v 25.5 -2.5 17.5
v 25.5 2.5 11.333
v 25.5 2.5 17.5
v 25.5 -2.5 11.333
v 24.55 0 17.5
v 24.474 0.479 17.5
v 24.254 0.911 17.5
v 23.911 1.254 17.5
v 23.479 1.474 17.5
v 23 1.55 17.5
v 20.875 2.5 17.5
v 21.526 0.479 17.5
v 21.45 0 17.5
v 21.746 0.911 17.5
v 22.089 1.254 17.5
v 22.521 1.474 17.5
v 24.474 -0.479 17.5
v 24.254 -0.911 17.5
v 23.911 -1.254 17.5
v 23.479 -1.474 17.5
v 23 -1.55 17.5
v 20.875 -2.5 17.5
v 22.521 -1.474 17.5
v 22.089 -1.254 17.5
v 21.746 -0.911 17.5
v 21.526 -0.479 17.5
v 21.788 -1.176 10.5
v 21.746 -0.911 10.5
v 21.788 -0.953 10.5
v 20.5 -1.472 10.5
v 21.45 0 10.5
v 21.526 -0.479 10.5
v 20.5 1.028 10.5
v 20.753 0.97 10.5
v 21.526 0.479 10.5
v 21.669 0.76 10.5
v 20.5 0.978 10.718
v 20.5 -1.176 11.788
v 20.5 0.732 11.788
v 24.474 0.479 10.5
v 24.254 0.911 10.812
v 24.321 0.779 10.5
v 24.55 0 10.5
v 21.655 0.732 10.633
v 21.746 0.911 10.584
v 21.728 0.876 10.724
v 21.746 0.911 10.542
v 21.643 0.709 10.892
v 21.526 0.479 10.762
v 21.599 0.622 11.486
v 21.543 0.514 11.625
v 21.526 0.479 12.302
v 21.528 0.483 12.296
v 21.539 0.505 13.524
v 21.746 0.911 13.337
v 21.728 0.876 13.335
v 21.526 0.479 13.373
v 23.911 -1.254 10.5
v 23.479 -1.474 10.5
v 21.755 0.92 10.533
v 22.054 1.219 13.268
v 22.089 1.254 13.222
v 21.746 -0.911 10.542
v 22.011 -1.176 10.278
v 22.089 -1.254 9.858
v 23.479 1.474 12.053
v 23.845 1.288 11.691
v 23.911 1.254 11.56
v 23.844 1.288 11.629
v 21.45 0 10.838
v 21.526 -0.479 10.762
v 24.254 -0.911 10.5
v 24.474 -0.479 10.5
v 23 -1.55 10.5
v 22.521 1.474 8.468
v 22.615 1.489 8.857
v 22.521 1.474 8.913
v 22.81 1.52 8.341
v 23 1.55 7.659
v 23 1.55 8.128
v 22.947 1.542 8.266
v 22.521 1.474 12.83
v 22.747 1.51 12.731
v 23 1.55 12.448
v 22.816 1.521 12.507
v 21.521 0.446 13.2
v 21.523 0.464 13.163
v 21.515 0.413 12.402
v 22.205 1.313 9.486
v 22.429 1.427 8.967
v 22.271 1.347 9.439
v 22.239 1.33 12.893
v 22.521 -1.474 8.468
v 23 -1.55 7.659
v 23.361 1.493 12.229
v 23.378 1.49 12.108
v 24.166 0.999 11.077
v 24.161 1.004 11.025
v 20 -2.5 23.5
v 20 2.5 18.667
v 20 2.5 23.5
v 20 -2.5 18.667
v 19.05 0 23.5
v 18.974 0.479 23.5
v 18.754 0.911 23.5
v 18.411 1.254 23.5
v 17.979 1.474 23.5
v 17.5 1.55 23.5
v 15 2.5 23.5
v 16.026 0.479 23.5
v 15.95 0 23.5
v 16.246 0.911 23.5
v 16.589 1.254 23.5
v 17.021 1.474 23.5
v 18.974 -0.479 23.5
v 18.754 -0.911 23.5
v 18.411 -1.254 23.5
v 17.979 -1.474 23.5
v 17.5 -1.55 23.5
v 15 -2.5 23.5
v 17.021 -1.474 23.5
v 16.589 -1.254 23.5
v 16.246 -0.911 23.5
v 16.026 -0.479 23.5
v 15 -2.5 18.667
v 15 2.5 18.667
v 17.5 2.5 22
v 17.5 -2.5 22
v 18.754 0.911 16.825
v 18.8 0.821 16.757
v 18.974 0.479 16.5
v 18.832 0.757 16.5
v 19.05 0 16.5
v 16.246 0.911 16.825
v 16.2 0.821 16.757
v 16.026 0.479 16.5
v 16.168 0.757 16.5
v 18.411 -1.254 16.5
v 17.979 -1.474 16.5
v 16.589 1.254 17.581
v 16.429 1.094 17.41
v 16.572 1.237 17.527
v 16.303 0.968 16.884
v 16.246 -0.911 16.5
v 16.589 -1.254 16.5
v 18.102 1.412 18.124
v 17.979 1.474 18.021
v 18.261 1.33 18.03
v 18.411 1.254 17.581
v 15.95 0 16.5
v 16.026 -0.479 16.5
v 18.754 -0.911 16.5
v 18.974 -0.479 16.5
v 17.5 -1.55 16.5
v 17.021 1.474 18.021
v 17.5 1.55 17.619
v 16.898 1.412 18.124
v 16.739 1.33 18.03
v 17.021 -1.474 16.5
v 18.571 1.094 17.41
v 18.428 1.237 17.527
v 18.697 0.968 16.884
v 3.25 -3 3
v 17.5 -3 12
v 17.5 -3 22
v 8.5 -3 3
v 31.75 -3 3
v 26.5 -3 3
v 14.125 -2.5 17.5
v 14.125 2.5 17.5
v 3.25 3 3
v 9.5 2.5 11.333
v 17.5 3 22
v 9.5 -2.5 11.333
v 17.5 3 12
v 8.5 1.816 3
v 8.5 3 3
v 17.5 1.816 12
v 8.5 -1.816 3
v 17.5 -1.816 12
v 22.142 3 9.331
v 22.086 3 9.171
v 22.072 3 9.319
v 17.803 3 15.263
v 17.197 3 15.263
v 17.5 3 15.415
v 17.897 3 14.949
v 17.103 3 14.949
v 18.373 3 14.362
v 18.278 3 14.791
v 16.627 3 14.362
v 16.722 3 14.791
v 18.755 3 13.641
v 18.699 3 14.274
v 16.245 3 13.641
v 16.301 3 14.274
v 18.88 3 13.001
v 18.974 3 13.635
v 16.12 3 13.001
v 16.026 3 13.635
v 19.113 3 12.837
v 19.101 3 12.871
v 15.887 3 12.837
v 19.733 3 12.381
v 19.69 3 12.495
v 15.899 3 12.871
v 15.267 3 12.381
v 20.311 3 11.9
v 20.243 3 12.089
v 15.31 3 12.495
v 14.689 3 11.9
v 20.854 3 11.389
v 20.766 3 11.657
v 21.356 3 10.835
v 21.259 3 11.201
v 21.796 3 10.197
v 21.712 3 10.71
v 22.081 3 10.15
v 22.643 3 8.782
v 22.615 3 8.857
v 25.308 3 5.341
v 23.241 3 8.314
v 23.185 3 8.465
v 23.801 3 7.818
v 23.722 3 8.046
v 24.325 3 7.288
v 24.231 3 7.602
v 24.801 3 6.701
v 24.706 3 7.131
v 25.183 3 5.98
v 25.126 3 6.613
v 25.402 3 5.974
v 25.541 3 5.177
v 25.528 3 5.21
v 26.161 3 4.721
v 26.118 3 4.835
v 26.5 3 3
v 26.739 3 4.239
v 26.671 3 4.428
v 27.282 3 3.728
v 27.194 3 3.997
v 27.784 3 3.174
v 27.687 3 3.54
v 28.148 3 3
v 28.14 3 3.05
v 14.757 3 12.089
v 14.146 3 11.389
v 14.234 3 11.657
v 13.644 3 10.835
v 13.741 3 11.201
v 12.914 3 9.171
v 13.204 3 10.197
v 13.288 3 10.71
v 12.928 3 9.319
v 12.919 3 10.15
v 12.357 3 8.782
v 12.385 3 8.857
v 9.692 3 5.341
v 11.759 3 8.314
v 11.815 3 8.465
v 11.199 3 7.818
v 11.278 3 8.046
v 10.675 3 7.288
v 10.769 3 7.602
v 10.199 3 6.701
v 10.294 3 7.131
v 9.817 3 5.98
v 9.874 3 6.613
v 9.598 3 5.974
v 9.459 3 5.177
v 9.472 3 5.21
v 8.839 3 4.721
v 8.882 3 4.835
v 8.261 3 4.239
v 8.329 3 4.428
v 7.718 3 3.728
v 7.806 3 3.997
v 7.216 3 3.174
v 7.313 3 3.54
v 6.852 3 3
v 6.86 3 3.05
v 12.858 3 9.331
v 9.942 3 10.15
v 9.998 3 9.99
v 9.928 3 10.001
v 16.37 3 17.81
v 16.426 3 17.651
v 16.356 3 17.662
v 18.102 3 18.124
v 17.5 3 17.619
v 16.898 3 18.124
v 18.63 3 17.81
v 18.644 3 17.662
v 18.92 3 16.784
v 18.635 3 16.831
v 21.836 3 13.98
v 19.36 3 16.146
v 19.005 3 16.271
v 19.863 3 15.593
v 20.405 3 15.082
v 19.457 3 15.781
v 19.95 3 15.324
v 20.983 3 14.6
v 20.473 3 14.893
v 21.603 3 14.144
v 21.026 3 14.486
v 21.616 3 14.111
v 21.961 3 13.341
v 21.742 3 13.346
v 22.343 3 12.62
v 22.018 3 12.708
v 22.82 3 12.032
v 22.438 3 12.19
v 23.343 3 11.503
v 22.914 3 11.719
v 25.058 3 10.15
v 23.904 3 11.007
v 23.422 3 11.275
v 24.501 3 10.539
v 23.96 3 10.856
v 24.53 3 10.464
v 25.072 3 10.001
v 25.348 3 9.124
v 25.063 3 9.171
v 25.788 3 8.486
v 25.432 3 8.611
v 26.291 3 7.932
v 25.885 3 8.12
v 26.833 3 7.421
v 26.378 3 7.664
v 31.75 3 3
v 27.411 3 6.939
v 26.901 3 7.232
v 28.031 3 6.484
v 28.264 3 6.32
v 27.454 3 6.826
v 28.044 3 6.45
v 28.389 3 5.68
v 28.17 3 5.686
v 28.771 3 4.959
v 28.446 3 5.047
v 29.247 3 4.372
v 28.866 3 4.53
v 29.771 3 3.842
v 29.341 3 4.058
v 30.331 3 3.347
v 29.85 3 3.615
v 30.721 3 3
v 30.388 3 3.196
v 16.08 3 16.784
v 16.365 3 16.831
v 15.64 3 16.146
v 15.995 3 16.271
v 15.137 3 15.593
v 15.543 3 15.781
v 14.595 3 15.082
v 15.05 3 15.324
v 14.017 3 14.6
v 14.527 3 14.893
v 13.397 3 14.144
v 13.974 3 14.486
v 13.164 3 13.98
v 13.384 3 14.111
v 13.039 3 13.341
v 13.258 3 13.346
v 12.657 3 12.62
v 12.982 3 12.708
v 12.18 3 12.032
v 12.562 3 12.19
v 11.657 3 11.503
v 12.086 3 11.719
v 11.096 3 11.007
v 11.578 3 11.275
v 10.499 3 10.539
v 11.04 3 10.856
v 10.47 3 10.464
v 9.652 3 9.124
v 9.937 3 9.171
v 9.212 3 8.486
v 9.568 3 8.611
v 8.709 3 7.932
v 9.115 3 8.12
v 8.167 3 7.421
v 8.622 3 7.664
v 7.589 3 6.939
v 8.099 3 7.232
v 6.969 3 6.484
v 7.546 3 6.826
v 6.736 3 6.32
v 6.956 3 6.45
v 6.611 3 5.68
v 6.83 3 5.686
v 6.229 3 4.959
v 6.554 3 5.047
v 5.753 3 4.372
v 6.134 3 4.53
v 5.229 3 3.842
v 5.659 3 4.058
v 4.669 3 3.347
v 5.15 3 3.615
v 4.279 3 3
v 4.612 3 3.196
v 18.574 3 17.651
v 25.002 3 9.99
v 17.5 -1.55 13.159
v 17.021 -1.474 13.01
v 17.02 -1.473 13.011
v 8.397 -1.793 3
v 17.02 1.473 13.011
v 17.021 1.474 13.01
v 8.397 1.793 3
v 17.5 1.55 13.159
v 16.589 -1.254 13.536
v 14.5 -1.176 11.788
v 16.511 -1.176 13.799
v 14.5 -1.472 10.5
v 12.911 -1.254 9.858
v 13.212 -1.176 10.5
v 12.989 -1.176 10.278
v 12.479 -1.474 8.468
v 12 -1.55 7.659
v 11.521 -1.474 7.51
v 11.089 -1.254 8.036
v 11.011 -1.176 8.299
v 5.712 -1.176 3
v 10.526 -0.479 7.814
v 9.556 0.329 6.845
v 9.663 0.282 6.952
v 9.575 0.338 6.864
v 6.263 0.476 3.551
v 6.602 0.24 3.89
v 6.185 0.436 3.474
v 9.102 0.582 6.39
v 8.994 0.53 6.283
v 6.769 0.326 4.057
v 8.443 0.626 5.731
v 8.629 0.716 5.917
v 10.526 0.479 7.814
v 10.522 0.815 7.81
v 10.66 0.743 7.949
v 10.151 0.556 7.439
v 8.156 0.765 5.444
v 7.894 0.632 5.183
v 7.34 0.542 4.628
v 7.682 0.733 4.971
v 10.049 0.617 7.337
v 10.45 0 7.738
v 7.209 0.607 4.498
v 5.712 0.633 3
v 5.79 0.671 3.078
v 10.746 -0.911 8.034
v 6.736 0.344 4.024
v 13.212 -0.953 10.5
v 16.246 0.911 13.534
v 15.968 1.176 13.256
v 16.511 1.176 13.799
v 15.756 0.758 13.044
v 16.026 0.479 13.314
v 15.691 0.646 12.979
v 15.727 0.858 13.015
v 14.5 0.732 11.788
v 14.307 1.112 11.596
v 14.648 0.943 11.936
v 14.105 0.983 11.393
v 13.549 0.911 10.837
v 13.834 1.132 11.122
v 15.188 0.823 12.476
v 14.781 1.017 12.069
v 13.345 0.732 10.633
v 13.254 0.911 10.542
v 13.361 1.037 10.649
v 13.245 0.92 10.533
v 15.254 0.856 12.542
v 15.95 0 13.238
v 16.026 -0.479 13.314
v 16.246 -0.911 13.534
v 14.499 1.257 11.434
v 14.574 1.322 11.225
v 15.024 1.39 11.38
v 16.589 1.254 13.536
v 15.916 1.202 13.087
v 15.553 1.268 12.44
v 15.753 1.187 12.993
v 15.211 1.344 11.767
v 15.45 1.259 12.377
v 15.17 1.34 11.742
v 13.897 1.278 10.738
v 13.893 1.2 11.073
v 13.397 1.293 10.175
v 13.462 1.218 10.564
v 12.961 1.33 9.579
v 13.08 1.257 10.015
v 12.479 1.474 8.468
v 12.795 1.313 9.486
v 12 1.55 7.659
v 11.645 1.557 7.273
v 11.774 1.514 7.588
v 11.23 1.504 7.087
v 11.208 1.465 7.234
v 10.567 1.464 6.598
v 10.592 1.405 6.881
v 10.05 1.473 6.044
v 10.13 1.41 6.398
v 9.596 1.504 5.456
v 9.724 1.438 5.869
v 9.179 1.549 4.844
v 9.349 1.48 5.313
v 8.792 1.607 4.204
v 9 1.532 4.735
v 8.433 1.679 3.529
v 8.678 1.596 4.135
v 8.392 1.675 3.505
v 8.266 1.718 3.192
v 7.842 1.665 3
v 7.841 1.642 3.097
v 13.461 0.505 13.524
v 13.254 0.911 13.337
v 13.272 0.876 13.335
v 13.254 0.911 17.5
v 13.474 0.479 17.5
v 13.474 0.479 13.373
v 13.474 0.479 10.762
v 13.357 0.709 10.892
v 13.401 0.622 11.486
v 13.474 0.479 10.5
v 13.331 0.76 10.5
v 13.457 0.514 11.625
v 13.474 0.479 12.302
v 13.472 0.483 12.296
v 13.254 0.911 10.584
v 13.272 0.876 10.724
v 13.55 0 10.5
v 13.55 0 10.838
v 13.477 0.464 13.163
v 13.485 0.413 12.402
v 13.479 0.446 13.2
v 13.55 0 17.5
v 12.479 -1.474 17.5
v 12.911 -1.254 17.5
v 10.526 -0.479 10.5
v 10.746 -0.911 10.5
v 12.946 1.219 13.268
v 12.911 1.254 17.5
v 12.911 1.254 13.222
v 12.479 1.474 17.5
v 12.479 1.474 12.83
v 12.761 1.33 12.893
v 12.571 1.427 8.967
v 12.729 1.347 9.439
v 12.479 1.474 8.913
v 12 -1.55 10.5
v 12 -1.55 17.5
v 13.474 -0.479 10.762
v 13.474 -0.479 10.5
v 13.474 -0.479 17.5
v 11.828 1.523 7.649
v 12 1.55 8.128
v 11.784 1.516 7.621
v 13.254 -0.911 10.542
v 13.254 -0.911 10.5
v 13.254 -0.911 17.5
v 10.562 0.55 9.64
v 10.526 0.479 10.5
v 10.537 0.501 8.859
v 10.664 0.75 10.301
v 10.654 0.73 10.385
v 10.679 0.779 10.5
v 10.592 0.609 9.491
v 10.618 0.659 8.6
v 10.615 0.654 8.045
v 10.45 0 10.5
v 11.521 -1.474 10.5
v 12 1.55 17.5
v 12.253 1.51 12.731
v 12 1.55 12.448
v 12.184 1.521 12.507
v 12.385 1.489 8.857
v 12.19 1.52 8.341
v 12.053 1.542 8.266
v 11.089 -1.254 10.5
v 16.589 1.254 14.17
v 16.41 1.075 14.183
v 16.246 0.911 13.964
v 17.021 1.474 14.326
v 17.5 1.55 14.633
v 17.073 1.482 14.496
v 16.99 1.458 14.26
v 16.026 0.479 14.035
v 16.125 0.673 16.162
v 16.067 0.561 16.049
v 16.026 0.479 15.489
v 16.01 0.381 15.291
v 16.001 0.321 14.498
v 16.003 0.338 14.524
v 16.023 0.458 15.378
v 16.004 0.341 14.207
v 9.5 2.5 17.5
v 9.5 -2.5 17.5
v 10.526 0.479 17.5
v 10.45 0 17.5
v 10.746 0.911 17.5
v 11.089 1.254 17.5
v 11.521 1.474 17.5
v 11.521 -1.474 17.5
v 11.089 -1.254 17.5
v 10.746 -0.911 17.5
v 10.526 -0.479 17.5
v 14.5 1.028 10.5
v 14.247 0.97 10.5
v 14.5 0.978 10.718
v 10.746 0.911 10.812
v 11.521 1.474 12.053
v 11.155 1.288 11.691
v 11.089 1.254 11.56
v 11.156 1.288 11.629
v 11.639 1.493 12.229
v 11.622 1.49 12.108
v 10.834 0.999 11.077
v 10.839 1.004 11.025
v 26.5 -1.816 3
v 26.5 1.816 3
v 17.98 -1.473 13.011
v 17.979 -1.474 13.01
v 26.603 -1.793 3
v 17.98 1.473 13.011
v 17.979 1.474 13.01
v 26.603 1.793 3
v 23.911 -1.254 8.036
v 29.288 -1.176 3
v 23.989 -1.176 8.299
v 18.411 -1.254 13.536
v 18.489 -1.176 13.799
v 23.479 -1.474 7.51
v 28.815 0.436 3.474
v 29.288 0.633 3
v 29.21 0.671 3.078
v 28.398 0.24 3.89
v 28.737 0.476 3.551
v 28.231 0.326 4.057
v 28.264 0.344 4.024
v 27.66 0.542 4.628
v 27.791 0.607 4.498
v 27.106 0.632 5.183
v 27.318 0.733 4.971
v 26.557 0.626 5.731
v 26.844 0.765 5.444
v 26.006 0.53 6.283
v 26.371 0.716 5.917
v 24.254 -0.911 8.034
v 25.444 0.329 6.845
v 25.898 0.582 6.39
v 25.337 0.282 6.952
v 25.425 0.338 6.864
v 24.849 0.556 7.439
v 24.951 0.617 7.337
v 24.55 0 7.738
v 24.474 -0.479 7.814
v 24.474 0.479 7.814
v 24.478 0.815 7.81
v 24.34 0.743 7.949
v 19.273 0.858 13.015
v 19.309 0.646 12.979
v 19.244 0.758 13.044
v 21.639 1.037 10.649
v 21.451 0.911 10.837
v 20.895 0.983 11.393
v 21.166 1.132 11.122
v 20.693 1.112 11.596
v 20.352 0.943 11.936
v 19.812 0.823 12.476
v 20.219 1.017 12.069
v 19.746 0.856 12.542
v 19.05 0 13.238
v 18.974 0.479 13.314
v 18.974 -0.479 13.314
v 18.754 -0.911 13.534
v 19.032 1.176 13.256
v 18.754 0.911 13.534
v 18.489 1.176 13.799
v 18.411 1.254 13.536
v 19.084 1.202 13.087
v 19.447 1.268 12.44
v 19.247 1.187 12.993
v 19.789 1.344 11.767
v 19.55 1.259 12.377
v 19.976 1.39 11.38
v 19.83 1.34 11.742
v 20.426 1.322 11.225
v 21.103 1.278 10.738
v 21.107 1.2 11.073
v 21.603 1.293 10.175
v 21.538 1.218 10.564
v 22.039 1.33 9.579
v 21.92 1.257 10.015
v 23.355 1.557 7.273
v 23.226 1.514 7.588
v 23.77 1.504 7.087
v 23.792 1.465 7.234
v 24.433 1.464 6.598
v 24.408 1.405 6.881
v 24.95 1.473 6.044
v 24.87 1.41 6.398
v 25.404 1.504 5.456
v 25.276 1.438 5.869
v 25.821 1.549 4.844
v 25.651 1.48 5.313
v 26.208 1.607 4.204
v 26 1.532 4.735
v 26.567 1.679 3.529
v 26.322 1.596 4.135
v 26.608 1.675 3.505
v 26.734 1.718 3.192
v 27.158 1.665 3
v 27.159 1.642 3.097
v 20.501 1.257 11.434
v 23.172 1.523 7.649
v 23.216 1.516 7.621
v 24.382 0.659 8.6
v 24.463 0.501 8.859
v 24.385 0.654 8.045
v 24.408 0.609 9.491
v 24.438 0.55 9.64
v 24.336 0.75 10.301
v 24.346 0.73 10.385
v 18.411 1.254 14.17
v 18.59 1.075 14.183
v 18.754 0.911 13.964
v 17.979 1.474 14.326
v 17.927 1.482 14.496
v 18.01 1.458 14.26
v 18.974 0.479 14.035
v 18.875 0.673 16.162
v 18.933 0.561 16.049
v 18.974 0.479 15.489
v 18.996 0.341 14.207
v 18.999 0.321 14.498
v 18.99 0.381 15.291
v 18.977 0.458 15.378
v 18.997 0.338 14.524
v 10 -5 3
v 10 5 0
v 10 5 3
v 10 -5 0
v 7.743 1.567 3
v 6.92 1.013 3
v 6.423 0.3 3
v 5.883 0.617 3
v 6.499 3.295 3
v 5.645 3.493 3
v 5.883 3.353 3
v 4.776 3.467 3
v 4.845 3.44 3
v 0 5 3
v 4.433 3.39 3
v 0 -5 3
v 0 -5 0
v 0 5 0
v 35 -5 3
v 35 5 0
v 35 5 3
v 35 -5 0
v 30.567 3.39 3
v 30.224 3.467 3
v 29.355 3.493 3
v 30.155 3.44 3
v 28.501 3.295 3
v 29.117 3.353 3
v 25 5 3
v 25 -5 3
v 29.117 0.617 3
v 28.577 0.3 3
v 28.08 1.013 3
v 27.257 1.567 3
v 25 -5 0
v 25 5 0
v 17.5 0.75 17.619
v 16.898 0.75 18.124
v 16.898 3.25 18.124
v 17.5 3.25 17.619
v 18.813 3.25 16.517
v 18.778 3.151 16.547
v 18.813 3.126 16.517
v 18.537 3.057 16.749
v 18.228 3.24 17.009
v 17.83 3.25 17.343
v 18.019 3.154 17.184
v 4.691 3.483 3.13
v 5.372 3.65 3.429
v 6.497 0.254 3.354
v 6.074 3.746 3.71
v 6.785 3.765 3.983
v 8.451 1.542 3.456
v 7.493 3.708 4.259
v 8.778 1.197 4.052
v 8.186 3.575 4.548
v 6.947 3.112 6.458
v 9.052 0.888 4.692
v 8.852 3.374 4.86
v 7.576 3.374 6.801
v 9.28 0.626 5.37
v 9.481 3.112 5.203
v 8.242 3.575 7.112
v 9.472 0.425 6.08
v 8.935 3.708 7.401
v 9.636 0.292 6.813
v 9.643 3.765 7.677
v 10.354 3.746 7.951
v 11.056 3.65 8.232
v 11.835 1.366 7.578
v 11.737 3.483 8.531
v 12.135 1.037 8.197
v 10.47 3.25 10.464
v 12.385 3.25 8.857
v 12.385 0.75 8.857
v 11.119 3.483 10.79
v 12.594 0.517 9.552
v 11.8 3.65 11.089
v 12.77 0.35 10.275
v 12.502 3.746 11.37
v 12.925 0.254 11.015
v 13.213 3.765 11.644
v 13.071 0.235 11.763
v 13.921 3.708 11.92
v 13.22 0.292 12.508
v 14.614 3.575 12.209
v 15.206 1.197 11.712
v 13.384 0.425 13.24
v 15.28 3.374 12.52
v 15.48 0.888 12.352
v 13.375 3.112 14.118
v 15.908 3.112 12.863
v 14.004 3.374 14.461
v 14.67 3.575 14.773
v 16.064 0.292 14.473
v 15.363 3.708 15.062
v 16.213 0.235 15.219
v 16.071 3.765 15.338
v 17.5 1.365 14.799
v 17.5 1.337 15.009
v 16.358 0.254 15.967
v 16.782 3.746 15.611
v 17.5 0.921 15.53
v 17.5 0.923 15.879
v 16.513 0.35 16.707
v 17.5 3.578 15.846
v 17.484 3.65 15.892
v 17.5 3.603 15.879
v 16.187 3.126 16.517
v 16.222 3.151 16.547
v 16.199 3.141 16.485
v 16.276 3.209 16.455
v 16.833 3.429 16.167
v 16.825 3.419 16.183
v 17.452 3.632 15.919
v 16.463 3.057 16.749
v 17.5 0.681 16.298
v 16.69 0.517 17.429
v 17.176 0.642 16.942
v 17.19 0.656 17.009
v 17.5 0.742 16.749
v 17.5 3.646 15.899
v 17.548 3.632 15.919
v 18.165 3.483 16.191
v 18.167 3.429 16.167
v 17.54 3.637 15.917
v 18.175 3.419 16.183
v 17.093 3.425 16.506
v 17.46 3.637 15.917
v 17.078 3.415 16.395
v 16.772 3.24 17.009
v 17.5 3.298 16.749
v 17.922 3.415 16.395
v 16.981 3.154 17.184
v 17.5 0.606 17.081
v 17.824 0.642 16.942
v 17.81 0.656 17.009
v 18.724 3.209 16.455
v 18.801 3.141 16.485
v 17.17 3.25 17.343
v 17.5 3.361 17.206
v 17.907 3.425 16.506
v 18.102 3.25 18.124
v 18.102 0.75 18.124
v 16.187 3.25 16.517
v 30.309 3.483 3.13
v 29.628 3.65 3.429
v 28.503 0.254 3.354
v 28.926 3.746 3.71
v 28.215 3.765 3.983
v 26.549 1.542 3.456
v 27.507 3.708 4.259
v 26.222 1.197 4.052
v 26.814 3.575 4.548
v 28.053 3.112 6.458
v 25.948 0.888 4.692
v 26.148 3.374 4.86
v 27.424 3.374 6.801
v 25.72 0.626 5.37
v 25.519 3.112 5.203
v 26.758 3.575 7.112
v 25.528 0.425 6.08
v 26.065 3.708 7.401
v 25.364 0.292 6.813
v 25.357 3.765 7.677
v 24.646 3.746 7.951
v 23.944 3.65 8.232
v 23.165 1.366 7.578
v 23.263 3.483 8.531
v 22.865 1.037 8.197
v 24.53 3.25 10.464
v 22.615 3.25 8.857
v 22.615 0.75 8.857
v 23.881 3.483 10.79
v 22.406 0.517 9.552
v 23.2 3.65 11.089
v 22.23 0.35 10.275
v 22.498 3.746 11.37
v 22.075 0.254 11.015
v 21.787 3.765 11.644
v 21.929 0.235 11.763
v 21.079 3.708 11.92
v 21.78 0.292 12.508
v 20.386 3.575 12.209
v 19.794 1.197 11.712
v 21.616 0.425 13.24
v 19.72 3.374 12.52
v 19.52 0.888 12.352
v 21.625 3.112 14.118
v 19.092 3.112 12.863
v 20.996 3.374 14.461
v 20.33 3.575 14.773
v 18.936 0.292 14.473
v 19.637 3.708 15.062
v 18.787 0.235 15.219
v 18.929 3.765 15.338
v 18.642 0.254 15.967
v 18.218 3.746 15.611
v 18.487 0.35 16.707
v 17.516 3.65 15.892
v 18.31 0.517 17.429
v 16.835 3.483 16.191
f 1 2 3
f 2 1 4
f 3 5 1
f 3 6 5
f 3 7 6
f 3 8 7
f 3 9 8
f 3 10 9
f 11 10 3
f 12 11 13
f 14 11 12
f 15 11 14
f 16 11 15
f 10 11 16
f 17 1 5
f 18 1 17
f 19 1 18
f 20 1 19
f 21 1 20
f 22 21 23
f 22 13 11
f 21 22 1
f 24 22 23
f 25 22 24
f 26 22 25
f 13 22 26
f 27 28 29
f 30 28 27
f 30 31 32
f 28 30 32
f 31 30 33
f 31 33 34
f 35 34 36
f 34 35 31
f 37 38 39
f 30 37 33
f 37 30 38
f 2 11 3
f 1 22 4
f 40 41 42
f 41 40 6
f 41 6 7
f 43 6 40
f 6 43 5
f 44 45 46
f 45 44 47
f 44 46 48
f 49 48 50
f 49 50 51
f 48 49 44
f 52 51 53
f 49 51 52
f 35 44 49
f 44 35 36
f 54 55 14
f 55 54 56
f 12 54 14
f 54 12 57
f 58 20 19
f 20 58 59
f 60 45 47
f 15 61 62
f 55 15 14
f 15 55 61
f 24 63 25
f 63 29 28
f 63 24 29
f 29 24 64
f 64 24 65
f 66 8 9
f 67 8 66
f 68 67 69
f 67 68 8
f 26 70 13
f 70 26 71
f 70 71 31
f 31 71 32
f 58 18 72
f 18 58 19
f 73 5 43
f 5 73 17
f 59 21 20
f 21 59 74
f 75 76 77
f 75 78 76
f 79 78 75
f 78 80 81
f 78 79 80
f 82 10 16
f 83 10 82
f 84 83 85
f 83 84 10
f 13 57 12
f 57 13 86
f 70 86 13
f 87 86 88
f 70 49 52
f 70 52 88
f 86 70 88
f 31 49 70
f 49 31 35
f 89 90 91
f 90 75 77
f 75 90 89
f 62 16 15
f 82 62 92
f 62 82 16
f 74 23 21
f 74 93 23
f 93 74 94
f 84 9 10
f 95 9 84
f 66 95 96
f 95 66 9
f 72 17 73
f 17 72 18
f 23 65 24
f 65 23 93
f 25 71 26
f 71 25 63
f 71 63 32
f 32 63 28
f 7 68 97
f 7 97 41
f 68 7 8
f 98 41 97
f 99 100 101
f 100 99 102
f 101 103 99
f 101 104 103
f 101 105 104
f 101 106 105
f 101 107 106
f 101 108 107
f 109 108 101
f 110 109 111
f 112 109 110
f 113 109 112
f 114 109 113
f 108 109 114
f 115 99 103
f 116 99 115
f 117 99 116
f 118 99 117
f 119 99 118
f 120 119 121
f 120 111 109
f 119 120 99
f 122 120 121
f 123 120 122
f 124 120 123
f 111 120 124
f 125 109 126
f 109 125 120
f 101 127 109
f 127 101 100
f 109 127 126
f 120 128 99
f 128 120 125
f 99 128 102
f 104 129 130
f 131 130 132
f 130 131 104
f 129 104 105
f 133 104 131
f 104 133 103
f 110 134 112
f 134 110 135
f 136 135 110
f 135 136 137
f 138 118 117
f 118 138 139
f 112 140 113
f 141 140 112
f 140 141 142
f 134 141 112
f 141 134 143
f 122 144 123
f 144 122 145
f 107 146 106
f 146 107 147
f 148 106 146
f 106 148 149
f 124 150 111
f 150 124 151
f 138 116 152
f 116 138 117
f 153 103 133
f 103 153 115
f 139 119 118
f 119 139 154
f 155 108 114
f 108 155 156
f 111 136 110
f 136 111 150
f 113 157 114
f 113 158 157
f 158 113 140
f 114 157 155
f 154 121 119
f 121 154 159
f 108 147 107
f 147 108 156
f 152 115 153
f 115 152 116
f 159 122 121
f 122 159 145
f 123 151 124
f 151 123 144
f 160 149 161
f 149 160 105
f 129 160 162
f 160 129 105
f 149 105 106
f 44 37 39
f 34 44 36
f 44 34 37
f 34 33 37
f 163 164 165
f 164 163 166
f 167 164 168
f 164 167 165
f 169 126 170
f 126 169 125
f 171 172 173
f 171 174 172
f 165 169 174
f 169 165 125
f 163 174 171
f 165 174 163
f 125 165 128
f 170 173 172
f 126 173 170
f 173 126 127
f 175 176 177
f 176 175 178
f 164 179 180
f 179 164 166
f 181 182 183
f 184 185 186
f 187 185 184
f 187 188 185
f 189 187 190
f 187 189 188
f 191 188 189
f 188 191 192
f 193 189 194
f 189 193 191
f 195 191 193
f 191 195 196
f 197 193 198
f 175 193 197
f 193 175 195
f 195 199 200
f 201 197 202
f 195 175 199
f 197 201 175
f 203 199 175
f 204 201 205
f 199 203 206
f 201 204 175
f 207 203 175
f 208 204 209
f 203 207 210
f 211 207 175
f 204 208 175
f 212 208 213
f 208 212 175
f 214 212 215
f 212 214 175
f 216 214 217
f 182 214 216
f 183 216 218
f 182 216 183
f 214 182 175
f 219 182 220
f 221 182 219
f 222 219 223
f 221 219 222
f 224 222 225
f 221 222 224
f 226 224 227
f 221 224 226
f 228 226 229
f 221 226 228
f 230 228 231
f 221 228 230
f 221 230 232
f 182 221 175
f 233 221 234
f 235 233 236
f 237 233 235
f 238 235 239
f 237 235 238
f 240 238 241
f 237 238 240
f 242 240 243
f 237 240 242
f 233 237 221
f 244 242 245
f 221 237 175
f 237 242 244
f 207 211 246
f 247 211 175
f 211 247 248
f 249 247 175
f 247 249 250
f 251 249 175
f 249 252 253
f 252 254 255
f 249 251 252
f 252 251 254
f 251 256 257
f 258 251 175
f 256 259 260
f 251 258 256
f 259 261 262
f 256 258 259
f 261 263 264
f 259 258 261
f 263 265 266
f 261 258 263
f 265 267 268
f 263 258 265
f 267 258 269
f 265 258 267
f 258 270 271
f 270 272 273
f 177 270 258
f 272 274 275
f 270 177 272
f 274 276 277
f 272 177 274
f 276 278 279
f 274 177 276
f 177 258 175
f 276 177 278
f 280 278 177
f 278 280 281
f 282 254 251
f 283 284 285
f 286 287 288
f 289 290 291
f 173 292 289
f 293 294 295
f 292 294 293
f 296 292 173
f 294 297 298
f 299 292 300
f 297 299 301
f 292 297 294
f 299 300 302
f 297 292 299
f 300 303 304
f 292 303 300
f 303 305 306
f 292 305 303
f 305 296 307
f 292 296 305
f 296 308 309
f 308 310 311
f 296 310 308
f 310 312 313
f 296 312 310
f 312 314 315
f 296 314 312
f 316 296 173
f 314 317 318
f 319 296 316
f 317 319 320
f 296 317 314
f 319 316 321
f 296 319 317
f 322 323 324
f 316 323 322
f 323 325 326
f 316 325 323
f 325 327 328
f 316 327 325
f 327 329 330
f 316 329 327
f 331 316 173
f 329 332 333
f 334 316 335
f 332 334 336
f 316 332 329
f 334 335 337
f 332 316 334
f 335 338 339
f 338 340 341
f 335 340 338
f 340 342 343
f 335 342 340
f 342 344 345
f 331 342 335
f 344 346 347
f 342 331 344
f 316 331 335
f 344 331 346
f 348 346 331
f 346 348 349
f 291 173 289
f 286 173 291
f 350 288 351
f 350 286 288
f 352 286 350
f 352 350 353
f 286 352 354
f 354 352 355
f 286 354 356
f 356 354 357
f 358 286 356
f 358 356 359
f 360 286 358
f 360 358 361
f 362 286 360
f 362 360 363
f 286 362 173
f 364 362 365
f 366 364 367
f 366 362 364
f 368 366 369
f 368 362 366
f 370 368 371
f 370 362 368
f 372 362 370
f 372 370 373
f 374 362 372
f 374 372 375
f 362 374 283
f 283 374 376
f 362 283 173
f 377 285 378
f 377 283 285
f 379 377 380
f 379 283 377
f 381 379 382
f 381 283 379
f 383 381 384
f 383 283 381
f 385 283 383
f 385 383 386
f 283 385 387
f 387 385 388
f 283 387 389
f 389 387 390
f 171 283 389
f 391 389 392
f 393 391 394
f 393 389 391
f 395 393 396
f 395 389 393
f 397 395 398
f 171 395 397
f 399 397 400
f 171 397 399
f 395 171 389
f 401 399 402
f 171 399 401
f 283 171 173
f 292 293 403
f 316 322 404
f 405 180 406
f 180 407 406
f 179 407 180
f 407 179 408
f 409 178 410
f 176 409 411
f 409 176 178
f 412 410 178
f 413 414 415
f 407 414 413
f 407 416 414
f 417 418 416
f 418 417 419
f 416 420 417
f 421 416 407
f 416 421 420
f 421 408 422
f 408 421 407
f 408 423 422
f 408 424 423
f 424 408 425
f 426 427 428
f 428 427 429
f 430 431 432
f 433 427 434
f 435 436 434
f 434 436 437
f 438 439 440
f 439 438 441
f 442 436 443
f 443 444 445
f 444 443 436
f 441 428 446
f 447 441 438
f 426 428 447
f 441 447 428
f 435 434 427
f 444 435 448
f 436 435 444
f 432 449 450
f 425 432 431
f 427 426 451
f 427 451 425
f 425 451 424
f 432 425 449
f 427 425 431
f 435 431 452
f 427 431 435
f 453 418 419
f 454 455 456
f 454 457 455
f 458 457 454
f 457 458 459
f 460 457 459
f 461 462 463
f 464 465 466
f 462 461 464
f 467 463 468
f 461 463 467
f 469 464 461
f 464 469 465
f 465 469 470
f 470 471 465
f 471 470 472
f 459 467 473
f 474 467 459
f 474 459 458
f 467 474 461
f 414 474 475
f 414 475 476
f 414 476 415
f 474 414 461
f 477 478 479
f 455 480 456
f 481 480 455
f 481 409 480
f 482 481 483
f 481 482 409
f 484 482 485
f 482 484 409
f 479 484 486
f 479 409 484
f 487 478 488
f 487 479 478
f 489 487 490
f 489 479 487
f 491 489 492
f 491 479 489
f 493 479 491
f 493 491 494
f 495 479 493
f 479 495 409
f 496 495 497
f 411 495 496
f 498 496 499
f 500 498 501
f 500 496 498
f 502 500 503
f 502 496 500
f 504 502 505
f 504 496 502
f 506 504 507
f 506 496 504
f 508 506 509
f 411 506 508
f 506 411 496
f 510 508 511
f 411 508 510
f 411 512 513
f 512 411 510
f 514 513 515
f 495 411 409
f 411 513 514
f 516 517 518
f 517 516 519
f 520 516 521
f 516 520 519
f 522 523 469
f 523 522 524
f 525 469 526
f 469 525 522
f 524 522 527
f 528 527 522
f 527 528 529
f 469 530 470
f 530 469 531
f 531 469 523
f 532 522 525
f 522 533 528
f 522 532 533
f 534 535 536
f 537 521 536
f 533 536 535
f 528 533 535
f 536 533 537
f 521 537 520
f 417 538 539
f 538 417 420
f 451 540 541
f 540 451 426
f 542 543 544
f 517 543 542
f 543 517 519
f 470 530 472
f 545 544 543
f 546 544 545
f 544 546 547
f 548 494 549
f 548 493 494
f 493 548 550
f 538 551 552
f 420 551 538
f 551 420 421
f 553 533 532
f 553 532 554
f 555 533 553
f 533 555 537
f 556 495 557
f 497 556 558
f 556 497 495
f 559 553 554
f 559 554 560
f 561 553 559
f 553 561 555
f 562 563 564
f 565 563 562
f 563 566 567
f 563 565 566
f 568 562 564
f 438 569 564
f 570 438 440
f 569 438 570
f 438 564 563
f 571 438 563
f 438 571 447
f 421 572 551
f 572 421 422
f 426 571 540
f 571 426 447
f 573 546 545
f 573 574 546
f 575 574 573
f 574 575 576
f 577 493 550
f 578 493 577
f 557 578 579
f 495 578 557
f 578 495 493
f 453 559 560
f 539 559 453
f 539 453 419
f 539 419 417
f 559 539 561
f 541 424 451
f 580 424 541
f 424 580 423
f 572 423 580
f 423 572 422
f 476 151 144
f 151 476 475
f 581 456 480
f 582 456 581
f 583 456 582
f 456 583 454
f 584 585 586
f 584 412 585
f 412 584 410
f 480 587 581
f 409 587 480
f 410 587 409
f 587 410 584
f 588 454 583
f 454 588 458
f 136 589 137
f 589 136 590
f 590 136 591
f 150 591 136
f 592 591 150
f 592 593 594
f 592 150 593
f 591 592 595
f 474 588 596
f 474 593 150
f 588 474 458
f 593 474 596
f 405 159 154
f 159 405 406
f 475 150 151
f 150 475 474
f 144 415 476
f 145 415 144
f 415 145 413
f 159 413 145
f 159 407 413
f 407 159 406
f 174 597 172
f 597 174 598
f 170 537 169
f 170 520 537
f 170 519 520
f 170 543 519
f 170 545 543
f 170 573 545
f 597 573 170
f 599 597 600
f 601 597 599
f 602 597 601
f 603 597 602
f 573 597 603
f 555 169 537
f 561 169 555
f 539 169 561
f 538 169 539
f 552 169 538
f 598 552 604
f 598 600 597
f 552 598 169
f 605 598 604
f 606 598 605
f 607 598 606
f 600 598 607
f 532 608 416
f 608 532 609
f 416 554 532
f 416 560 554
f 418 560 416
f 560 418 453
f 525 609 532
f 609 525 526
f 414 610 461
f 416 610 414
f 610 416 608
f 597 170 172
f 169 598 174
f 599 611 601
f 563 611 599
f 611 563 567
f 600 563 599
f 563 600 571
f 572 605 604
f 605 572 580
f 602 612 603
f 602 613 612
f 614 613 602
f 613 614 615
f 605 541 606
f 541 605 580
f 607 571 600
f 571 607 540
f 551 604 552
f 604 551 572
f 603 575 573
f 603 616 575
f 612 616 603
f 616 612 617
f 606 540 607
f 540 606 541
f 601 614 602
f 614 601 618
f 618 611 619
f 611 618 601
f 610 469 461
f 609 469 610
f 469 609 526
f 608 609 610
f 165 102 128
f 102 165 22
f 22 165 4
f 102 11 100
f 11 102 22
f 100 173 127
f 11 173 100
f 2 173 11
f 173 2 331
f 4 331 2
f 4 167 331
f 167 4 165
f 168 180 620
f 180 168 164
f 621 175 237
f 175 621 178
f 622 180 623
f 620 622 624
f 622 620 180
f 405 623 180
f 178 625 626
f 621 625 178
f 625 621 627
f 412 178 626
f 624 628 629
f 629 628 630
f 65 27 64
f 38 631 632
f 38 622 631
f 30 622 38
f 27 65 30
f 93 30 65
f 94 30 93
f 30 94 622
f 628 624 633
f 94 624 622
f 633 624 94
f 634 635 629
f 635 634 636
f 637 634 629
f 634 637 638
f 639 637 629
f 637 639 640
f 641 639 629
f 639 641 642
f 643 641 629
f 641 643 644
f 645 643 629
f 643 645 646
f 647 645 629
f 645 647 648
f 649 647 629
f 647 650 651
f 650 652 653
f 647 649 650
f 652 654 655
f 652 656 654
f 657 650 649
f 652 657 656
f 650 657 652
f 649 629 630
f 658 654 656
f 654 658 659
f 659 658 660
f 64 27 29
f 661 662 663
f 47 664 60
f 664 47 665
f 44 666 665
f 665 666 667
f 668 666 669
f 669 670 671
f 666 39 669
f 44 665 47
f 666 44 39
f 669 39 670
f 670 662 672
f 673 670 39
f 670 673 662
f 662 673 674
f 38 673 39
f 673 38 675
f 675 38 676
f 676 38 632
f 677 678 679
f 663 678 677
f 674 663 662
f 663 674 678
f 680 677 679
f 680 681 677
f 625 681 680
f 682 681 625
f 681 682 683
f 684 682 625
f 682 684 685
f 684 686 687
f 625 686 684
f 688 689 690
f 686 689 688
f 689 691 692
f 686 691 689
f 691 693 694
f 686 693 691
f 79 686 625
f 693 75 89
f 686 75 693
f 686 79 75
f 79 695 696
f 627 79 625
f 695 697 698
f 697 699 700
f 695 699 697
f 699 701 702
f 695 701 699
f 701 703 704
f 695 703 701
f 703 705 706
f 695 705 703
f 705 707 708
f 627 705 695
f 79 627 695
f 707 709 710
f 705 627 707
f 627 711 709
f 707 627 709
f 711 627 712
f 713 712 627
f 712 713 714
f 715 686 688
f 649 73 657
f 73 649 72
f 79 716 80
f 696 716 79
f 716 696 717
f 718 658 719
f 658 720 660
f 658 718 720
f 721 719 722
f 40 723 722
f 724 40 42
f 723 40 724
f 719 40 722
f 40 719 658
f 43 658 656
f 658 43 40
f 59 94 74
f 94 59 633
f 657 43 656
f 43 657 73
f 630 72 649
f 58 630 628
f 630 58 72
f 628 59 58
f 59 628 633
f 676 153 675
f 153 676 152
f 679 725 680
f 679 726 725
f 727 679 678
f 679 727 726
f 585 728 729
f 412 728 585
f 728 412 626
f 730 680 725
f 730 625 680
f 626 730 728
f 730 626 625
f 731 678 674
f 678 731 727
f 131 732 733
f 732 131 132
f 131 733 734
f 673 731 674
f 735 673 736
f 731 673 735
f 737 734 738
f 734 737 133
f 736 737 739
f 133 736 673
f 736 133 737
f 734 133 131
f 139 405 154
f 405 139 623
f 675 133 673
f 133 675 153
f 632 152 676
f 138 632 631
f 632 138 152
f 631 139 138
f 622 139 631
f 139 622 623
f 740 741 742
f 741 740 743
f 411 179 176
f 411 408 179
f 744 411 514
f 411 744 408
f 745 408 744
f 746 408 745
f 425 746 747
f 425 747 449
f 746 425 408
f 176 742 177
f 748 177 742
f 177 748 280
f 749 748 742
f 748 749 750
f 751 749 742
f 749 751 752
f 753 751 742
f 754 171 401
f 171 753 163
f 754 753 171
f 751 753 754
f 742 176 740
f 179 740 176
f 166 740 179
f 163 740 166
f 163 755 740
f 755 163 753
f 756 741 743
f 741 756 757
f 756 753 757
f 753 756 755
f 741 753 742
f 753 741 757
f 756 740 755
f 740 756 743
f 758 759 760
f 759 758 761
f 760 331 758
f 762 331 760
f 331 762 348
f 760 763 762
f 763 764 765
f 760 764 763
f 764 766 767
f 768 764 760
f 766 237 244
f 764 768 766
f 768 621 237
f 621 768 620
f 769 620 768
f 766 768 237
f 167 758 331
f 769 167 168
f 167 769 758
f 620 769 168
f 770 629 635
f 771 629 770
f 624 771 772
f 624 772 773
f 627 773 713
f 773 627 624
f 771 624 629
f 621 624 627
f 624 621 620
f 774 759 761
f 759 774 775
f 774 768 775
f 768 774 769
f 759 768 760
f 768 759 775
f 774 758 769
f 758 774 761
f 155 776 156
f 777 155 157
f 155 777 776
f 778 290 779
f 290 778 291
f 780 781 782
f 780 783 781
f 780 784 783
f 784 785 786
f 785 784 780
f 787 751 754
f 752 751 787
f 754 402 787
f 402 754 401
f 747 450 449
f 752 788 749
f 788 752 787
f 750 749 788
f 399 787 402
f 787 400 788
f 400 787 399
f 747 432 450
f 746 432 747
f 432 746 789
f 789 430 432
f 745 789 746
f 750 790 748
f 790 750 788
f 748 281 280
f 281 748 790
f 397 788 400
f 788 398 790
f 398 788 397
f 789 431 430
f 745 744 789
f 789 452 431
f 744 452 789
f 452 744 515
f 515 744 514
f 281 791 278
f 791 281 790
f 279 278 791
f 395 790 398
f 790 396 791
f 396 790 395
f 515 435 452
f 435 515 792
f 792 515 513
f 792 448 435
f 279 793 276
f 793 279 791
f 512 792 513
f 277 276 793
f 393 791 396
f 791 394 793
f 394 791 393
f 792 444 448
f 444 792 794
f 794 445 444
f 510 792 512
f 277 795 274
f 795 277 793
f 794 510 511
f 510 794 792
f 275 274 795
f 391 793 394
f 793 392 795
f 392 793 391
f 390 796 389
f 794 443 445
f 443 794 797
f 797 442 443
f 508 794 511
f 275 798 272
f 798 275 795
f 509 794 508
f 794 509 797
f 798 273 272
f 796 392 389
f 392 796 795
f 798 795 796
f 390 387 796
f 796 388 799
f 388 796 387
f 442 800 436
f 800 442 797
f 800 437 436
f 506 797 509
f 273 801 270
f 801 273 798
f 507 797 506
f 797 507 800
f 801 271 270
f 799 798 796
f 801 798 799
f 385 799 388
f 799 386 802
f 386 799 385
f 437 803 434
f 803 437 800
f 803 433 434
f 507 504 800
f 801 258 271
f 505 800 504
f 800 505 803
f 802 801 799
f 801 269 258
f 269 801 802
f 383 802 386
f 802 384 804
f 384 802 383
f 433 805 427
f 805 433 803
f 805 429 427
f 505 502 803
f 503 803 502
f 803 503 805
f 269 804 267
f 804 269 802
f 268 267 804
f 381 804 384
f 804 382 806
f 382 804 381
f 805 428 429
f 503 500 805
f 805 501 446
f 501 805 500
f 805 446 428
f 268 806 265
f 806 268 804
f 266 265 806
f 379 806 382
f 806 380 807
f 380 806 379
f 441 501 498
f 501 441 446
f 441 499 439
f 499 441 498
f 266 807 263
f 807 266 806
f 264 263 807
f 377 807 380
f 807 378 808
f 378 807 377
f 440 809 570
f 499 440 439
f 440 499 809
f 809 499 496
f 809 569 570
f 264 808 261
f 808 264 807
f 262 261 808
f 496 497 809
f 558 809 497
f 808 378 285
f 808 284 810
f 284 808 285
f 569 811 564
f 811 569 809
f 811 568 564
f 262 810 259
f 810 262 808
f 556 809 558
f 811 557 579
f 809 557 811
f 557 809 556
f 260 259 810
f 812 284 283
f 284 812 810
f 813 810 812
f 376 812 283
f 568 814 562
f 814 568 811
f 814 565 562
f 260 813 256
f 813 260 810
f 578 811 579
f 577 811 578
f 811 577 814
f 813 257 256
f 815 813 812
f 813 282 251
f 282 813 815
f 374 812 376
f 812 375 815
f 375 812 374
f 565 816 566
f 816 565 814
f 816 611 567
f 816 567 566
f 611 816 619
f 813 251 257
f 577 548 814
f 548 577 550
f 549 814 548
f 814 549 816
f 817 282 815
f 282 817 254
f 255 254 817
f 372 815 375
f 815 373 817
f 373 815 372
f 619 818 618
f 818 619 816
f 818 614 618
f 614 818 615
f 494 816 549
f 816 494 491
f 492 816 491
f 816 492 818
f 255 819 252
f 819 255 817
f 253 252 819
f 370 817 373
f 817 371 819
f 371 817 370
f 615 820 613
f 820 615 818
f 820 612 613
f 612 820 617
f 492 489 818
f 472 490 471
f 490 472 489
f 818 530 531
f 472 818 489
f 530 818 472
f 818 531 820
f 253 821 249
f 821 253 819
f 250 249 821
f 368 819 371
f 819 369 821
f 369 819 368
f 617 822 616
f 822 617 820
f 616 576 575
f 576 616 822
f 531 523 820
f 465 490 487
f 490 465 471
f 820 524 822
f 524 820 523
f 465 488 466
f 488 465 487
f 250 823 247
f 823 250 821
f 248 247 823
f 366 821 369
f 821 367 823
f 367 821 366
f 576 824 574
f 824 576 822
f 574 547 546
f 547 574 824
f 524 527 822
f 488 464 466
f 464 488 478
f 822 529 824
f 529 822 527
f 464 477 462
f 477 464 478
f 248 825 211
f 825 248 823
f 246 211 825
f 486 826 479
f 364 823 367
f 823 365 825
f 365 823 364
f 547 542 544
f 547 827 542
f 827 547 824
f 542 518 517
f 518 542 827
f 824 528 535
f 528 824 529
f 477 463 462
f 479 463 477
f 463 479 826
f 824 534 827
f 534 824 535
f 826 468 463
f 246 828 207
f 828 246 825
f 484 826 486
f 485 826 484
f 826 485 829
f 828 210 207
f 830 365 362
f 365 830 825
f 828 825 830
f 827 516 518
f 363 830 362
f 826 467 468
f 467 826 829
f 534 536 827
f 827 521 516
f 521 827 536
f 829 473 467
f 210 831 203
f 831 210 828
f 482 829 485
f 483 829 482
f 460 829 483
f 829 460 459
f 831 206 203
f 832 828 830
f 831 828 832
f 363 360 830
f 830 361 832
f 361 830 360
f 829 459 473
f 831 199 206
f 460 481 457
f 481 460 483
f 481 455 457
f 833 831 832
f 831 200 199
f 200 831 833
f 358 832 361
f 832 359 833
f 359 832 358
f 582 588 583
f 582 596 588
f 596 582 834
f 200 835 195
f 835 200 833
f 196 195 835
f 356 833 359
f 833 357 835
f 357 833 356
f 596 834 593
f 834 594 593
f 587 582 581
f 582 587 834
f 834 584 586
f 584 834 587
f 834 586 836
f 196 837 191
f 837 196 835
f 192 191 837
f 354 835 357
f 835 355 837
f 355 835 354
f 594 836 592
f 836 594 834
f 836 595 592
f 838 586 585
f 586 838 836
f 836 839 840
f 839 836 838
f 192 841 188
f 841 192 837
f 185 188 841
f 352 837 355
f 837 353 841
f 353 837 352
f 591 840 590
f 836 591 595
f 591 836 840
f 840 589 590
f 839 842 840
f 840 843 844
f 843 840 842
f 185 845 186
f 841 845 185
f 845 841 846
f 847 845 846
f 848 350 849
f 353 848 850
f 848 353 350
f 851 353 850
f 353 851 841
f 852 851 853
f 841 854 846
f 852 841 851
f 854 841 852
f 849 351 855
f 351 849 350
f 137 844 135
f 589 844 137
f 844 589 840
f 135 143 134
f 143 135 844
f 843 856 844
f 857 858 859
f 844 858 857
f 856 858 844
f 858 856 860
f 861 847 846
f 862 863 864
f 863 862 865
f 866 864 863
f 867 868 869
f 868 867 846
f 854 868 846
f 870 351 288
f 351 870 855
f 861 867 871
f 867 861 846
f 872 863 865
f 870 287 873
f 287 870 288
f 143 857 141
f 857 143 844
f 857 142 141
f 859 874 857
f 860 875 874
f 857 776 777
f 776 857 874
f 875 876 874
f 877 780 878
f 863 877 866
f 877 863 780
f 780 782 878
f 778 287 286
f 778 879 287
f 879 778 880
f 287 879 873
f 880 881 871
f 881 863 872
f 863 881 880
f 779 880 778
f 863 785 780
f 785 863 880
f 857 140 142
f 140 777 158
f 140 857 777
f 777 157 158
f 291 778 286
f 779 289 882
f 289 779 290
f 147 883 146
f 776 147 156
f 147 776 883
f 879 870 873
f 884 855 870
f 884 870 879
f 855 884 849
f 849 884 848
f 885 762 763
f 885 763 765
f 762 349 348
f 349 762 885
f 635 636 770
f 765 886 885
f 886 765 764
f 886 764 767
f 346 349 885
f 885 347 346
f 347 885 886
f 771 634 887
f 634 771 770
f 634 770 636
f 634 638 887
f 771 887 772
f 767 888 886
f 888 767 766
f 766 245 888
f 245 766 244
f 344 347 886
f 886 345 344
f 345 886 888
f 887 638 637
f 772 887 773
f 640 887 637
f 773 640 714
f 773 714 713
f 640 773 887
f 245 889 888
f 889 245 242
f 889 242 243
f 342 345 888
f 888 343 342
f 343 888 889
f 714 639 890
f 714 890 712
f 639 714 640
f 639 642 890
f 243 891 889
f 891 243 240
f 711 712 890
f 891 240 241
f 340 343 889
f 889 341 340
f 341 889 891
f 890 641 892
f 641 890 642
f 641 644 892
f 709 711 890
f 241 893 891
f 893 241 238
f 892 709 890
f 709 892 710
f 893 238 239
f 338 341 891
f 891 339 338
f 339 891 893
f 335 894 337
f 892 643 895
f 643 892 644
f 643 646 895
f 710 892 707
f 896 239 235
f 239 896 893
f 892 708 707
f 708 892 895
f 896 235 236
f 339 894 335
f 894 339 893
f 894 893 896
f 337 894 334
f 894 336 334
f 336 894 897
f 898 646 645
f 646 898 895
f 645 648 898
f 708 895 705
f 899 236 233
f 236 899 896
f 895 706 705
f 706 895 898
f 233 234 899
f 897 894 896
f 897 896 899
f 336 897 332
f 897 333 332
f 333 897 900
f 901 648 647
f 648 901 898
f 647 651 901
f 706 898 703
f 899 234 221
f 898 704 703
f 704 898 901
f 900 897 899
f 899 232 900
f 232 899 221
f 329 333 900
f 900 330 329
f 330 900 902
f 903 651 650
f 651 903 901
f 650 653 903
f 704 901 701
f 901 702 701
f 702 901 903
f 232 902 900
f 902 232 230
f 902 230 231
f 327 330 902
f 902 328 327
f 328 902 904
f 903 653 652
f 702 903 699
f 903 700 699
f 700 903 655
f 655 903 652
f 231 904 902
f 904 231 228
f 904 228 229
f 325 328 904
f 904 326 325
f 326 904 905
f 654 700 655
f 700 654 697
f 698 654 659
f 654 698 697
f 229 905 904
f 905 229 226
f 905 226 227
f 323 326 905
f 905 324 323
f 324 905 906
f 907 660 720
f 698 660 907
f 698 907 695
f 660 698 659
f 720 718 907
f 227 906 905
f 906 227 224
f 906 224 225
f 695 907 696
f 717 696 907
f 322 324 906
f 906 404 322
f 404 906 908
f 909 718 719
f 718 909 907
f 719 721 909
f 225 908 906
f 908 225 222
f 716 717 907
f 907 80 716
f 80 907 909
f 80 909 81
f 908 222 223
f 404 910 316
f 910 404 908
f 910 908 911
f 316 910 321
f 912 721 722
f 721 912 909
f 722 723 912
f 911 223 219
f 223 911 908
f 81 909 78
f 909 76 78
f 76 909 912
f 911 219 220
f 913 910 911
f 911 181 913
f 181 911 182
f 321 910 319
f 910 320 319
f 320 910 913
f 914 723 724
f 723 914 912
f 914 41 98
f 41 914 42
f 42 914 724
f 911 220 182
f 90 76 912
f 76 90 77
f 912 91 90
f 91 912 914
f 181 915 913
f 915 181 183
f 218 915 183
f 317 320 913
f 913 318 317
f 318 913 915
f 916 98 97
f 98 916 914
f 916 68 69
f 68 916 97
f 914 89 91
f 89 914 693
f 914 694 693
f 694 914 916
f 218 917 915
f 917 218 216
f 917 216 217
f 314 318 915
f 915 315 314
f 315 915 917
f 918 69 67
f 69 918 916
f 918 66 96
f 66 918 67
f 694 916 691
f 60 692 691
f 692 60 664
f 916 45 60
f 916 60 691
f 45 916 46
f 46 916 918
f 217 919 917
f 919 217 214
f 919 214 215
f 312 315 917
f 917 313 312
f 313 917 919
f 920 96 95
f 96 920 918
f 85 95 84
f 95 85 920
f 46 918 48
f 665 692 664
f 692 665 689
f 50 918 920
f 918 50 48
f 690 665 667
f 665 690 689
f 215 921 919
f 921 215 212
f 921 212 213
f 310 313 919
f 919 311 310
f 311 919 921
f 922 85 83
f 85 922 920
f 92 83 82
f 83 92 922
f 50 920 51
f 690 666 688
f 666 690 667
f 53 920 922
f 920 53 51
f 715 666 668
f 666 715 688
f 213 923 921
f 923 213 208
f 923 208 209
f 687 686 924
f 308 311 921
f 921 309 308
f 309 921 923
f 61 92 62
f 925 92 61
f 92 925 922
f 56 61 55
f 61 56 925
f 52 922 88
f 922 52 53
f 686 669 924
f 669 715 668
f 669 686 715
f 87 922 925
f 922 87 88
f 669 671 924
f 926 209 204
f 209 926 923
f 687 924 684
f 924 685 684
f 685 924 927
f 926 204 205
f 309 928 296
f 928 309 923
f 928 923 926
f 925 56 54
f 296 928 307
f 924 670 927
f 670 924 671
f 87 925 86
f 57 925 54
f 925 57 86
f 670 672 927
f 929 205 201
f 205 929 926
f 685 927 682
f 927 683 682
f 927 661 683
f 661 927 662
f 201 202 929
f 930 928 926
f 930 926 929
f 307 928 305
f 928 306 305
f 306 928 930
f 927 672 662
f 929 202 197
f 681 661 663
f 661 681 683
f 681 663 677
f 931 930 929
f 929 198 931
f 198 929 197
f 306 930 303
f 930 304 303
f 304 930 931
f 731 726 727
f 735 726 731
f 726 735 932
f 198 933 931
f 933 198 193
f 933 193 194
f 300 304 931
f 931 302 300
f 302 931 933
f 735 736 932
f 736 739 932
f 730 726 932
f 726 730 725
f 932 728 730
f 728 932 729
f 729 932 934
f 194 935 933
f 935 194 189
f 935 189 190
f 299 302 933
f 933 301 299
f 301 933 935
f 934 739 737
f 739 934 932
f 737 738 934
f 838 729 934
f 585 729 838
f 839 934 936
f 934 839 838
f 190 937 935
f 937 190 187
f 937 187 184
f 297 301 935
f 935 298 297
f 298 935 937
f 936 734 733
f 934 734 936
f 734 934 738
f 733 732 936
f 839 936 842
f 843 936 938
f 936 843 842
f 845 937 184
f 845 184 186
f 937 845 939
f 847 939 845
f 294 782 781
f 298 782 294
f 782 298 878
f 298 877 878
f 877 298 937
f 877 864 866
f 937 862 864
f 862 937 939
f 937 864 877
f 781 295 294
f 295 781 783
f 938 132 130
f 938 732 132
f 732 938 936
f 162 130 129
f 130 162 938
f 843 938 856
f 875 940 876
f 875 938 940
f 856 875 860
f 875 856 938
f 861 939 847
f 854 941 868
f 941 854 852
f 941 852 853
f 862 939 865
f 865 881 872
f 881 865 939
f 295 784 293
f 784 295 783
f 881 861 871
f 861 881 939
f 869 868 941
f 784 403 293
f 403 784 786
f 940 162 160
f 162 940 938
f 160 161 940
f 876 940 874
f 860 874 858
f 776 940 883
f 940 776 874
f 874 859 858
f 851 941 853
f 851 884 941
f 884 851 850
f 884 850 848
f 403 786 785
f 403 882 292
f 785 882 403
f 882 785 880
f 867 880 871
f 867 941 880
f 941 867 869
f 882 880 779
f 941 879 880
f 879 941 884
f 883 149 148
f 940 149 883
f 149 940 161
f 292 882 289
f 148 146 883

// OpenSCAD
//baser
translate([0,-5,0])
cube([10,10,3]);
translate([25,-5,0])
cube([10,10,3]);



//stakar
module stake()
{

difference()
{
  union()
  {

    translate([23,0,14])
    hallare();
    translate([17.5,0,20])
    hallare();
  }

    translate([32,2.5,0])
    rotate([0,-45,0])
    cylinder(r=2, h=30, $fn=5);
}

difference()
{

  difference()
  {
    union()
    {

    translate([2.5,3,2])
    rotate([90,0,0])
    linear_extrude(height=6)
    polygon(points=[[0,0],[5,0],[15,10],[15,20]]);
    }

    translate([5,0,0])
    rotate([0,45,0])
    cylinder(r=2, h=30, $fn=5);
}


//cylinders
union()
{
  translate([12,0,0])
  cylinder(r=1.55, h=20, $fn=20);
  translate([17.5,0,5])
  cylinder(r=1.55, h=20, $fn=20);
}

}
}

/*
difference()
{
  stake();
  translate([5,2,0])
  rotate([0,45,0])
  cylinder(r=2, h=30, $fn=5);
}
*/
//stake();

//finsaker
module finsak()
{
  translate([5,-2,2])
  rotate([0,40,0])
  linear_extrude(height=20, twist=360, slices=30)
  square(2.5, center=true);
}

  stake();


mirror([1,0,0])
translate([-35,0,0])
stake();

/*
finsak();
mirror([1,0,0])
translate([-35,0,0])
finsak();
*/

translate([0,4,0])
finsak();
mirror([1,0,0])
translate([-35,4,0])
finsak();

module hallare()
{
  difference()
  {
  cube([5,5,7], center=true);
  translate([0,0,-7])
  cylinder(r=1.55, h=15, $fn=20);
  }
}

//hallare();


//sidosak h
//translate([25,2.5,12])
//cube([5,5,8]);
//hallare();

//sidosak v
//translate([7,0,7])

//cube([5,5,8]);
//translate([10,2.5,2])
//cylinder(r=1.5, h=20, $fn=20);
